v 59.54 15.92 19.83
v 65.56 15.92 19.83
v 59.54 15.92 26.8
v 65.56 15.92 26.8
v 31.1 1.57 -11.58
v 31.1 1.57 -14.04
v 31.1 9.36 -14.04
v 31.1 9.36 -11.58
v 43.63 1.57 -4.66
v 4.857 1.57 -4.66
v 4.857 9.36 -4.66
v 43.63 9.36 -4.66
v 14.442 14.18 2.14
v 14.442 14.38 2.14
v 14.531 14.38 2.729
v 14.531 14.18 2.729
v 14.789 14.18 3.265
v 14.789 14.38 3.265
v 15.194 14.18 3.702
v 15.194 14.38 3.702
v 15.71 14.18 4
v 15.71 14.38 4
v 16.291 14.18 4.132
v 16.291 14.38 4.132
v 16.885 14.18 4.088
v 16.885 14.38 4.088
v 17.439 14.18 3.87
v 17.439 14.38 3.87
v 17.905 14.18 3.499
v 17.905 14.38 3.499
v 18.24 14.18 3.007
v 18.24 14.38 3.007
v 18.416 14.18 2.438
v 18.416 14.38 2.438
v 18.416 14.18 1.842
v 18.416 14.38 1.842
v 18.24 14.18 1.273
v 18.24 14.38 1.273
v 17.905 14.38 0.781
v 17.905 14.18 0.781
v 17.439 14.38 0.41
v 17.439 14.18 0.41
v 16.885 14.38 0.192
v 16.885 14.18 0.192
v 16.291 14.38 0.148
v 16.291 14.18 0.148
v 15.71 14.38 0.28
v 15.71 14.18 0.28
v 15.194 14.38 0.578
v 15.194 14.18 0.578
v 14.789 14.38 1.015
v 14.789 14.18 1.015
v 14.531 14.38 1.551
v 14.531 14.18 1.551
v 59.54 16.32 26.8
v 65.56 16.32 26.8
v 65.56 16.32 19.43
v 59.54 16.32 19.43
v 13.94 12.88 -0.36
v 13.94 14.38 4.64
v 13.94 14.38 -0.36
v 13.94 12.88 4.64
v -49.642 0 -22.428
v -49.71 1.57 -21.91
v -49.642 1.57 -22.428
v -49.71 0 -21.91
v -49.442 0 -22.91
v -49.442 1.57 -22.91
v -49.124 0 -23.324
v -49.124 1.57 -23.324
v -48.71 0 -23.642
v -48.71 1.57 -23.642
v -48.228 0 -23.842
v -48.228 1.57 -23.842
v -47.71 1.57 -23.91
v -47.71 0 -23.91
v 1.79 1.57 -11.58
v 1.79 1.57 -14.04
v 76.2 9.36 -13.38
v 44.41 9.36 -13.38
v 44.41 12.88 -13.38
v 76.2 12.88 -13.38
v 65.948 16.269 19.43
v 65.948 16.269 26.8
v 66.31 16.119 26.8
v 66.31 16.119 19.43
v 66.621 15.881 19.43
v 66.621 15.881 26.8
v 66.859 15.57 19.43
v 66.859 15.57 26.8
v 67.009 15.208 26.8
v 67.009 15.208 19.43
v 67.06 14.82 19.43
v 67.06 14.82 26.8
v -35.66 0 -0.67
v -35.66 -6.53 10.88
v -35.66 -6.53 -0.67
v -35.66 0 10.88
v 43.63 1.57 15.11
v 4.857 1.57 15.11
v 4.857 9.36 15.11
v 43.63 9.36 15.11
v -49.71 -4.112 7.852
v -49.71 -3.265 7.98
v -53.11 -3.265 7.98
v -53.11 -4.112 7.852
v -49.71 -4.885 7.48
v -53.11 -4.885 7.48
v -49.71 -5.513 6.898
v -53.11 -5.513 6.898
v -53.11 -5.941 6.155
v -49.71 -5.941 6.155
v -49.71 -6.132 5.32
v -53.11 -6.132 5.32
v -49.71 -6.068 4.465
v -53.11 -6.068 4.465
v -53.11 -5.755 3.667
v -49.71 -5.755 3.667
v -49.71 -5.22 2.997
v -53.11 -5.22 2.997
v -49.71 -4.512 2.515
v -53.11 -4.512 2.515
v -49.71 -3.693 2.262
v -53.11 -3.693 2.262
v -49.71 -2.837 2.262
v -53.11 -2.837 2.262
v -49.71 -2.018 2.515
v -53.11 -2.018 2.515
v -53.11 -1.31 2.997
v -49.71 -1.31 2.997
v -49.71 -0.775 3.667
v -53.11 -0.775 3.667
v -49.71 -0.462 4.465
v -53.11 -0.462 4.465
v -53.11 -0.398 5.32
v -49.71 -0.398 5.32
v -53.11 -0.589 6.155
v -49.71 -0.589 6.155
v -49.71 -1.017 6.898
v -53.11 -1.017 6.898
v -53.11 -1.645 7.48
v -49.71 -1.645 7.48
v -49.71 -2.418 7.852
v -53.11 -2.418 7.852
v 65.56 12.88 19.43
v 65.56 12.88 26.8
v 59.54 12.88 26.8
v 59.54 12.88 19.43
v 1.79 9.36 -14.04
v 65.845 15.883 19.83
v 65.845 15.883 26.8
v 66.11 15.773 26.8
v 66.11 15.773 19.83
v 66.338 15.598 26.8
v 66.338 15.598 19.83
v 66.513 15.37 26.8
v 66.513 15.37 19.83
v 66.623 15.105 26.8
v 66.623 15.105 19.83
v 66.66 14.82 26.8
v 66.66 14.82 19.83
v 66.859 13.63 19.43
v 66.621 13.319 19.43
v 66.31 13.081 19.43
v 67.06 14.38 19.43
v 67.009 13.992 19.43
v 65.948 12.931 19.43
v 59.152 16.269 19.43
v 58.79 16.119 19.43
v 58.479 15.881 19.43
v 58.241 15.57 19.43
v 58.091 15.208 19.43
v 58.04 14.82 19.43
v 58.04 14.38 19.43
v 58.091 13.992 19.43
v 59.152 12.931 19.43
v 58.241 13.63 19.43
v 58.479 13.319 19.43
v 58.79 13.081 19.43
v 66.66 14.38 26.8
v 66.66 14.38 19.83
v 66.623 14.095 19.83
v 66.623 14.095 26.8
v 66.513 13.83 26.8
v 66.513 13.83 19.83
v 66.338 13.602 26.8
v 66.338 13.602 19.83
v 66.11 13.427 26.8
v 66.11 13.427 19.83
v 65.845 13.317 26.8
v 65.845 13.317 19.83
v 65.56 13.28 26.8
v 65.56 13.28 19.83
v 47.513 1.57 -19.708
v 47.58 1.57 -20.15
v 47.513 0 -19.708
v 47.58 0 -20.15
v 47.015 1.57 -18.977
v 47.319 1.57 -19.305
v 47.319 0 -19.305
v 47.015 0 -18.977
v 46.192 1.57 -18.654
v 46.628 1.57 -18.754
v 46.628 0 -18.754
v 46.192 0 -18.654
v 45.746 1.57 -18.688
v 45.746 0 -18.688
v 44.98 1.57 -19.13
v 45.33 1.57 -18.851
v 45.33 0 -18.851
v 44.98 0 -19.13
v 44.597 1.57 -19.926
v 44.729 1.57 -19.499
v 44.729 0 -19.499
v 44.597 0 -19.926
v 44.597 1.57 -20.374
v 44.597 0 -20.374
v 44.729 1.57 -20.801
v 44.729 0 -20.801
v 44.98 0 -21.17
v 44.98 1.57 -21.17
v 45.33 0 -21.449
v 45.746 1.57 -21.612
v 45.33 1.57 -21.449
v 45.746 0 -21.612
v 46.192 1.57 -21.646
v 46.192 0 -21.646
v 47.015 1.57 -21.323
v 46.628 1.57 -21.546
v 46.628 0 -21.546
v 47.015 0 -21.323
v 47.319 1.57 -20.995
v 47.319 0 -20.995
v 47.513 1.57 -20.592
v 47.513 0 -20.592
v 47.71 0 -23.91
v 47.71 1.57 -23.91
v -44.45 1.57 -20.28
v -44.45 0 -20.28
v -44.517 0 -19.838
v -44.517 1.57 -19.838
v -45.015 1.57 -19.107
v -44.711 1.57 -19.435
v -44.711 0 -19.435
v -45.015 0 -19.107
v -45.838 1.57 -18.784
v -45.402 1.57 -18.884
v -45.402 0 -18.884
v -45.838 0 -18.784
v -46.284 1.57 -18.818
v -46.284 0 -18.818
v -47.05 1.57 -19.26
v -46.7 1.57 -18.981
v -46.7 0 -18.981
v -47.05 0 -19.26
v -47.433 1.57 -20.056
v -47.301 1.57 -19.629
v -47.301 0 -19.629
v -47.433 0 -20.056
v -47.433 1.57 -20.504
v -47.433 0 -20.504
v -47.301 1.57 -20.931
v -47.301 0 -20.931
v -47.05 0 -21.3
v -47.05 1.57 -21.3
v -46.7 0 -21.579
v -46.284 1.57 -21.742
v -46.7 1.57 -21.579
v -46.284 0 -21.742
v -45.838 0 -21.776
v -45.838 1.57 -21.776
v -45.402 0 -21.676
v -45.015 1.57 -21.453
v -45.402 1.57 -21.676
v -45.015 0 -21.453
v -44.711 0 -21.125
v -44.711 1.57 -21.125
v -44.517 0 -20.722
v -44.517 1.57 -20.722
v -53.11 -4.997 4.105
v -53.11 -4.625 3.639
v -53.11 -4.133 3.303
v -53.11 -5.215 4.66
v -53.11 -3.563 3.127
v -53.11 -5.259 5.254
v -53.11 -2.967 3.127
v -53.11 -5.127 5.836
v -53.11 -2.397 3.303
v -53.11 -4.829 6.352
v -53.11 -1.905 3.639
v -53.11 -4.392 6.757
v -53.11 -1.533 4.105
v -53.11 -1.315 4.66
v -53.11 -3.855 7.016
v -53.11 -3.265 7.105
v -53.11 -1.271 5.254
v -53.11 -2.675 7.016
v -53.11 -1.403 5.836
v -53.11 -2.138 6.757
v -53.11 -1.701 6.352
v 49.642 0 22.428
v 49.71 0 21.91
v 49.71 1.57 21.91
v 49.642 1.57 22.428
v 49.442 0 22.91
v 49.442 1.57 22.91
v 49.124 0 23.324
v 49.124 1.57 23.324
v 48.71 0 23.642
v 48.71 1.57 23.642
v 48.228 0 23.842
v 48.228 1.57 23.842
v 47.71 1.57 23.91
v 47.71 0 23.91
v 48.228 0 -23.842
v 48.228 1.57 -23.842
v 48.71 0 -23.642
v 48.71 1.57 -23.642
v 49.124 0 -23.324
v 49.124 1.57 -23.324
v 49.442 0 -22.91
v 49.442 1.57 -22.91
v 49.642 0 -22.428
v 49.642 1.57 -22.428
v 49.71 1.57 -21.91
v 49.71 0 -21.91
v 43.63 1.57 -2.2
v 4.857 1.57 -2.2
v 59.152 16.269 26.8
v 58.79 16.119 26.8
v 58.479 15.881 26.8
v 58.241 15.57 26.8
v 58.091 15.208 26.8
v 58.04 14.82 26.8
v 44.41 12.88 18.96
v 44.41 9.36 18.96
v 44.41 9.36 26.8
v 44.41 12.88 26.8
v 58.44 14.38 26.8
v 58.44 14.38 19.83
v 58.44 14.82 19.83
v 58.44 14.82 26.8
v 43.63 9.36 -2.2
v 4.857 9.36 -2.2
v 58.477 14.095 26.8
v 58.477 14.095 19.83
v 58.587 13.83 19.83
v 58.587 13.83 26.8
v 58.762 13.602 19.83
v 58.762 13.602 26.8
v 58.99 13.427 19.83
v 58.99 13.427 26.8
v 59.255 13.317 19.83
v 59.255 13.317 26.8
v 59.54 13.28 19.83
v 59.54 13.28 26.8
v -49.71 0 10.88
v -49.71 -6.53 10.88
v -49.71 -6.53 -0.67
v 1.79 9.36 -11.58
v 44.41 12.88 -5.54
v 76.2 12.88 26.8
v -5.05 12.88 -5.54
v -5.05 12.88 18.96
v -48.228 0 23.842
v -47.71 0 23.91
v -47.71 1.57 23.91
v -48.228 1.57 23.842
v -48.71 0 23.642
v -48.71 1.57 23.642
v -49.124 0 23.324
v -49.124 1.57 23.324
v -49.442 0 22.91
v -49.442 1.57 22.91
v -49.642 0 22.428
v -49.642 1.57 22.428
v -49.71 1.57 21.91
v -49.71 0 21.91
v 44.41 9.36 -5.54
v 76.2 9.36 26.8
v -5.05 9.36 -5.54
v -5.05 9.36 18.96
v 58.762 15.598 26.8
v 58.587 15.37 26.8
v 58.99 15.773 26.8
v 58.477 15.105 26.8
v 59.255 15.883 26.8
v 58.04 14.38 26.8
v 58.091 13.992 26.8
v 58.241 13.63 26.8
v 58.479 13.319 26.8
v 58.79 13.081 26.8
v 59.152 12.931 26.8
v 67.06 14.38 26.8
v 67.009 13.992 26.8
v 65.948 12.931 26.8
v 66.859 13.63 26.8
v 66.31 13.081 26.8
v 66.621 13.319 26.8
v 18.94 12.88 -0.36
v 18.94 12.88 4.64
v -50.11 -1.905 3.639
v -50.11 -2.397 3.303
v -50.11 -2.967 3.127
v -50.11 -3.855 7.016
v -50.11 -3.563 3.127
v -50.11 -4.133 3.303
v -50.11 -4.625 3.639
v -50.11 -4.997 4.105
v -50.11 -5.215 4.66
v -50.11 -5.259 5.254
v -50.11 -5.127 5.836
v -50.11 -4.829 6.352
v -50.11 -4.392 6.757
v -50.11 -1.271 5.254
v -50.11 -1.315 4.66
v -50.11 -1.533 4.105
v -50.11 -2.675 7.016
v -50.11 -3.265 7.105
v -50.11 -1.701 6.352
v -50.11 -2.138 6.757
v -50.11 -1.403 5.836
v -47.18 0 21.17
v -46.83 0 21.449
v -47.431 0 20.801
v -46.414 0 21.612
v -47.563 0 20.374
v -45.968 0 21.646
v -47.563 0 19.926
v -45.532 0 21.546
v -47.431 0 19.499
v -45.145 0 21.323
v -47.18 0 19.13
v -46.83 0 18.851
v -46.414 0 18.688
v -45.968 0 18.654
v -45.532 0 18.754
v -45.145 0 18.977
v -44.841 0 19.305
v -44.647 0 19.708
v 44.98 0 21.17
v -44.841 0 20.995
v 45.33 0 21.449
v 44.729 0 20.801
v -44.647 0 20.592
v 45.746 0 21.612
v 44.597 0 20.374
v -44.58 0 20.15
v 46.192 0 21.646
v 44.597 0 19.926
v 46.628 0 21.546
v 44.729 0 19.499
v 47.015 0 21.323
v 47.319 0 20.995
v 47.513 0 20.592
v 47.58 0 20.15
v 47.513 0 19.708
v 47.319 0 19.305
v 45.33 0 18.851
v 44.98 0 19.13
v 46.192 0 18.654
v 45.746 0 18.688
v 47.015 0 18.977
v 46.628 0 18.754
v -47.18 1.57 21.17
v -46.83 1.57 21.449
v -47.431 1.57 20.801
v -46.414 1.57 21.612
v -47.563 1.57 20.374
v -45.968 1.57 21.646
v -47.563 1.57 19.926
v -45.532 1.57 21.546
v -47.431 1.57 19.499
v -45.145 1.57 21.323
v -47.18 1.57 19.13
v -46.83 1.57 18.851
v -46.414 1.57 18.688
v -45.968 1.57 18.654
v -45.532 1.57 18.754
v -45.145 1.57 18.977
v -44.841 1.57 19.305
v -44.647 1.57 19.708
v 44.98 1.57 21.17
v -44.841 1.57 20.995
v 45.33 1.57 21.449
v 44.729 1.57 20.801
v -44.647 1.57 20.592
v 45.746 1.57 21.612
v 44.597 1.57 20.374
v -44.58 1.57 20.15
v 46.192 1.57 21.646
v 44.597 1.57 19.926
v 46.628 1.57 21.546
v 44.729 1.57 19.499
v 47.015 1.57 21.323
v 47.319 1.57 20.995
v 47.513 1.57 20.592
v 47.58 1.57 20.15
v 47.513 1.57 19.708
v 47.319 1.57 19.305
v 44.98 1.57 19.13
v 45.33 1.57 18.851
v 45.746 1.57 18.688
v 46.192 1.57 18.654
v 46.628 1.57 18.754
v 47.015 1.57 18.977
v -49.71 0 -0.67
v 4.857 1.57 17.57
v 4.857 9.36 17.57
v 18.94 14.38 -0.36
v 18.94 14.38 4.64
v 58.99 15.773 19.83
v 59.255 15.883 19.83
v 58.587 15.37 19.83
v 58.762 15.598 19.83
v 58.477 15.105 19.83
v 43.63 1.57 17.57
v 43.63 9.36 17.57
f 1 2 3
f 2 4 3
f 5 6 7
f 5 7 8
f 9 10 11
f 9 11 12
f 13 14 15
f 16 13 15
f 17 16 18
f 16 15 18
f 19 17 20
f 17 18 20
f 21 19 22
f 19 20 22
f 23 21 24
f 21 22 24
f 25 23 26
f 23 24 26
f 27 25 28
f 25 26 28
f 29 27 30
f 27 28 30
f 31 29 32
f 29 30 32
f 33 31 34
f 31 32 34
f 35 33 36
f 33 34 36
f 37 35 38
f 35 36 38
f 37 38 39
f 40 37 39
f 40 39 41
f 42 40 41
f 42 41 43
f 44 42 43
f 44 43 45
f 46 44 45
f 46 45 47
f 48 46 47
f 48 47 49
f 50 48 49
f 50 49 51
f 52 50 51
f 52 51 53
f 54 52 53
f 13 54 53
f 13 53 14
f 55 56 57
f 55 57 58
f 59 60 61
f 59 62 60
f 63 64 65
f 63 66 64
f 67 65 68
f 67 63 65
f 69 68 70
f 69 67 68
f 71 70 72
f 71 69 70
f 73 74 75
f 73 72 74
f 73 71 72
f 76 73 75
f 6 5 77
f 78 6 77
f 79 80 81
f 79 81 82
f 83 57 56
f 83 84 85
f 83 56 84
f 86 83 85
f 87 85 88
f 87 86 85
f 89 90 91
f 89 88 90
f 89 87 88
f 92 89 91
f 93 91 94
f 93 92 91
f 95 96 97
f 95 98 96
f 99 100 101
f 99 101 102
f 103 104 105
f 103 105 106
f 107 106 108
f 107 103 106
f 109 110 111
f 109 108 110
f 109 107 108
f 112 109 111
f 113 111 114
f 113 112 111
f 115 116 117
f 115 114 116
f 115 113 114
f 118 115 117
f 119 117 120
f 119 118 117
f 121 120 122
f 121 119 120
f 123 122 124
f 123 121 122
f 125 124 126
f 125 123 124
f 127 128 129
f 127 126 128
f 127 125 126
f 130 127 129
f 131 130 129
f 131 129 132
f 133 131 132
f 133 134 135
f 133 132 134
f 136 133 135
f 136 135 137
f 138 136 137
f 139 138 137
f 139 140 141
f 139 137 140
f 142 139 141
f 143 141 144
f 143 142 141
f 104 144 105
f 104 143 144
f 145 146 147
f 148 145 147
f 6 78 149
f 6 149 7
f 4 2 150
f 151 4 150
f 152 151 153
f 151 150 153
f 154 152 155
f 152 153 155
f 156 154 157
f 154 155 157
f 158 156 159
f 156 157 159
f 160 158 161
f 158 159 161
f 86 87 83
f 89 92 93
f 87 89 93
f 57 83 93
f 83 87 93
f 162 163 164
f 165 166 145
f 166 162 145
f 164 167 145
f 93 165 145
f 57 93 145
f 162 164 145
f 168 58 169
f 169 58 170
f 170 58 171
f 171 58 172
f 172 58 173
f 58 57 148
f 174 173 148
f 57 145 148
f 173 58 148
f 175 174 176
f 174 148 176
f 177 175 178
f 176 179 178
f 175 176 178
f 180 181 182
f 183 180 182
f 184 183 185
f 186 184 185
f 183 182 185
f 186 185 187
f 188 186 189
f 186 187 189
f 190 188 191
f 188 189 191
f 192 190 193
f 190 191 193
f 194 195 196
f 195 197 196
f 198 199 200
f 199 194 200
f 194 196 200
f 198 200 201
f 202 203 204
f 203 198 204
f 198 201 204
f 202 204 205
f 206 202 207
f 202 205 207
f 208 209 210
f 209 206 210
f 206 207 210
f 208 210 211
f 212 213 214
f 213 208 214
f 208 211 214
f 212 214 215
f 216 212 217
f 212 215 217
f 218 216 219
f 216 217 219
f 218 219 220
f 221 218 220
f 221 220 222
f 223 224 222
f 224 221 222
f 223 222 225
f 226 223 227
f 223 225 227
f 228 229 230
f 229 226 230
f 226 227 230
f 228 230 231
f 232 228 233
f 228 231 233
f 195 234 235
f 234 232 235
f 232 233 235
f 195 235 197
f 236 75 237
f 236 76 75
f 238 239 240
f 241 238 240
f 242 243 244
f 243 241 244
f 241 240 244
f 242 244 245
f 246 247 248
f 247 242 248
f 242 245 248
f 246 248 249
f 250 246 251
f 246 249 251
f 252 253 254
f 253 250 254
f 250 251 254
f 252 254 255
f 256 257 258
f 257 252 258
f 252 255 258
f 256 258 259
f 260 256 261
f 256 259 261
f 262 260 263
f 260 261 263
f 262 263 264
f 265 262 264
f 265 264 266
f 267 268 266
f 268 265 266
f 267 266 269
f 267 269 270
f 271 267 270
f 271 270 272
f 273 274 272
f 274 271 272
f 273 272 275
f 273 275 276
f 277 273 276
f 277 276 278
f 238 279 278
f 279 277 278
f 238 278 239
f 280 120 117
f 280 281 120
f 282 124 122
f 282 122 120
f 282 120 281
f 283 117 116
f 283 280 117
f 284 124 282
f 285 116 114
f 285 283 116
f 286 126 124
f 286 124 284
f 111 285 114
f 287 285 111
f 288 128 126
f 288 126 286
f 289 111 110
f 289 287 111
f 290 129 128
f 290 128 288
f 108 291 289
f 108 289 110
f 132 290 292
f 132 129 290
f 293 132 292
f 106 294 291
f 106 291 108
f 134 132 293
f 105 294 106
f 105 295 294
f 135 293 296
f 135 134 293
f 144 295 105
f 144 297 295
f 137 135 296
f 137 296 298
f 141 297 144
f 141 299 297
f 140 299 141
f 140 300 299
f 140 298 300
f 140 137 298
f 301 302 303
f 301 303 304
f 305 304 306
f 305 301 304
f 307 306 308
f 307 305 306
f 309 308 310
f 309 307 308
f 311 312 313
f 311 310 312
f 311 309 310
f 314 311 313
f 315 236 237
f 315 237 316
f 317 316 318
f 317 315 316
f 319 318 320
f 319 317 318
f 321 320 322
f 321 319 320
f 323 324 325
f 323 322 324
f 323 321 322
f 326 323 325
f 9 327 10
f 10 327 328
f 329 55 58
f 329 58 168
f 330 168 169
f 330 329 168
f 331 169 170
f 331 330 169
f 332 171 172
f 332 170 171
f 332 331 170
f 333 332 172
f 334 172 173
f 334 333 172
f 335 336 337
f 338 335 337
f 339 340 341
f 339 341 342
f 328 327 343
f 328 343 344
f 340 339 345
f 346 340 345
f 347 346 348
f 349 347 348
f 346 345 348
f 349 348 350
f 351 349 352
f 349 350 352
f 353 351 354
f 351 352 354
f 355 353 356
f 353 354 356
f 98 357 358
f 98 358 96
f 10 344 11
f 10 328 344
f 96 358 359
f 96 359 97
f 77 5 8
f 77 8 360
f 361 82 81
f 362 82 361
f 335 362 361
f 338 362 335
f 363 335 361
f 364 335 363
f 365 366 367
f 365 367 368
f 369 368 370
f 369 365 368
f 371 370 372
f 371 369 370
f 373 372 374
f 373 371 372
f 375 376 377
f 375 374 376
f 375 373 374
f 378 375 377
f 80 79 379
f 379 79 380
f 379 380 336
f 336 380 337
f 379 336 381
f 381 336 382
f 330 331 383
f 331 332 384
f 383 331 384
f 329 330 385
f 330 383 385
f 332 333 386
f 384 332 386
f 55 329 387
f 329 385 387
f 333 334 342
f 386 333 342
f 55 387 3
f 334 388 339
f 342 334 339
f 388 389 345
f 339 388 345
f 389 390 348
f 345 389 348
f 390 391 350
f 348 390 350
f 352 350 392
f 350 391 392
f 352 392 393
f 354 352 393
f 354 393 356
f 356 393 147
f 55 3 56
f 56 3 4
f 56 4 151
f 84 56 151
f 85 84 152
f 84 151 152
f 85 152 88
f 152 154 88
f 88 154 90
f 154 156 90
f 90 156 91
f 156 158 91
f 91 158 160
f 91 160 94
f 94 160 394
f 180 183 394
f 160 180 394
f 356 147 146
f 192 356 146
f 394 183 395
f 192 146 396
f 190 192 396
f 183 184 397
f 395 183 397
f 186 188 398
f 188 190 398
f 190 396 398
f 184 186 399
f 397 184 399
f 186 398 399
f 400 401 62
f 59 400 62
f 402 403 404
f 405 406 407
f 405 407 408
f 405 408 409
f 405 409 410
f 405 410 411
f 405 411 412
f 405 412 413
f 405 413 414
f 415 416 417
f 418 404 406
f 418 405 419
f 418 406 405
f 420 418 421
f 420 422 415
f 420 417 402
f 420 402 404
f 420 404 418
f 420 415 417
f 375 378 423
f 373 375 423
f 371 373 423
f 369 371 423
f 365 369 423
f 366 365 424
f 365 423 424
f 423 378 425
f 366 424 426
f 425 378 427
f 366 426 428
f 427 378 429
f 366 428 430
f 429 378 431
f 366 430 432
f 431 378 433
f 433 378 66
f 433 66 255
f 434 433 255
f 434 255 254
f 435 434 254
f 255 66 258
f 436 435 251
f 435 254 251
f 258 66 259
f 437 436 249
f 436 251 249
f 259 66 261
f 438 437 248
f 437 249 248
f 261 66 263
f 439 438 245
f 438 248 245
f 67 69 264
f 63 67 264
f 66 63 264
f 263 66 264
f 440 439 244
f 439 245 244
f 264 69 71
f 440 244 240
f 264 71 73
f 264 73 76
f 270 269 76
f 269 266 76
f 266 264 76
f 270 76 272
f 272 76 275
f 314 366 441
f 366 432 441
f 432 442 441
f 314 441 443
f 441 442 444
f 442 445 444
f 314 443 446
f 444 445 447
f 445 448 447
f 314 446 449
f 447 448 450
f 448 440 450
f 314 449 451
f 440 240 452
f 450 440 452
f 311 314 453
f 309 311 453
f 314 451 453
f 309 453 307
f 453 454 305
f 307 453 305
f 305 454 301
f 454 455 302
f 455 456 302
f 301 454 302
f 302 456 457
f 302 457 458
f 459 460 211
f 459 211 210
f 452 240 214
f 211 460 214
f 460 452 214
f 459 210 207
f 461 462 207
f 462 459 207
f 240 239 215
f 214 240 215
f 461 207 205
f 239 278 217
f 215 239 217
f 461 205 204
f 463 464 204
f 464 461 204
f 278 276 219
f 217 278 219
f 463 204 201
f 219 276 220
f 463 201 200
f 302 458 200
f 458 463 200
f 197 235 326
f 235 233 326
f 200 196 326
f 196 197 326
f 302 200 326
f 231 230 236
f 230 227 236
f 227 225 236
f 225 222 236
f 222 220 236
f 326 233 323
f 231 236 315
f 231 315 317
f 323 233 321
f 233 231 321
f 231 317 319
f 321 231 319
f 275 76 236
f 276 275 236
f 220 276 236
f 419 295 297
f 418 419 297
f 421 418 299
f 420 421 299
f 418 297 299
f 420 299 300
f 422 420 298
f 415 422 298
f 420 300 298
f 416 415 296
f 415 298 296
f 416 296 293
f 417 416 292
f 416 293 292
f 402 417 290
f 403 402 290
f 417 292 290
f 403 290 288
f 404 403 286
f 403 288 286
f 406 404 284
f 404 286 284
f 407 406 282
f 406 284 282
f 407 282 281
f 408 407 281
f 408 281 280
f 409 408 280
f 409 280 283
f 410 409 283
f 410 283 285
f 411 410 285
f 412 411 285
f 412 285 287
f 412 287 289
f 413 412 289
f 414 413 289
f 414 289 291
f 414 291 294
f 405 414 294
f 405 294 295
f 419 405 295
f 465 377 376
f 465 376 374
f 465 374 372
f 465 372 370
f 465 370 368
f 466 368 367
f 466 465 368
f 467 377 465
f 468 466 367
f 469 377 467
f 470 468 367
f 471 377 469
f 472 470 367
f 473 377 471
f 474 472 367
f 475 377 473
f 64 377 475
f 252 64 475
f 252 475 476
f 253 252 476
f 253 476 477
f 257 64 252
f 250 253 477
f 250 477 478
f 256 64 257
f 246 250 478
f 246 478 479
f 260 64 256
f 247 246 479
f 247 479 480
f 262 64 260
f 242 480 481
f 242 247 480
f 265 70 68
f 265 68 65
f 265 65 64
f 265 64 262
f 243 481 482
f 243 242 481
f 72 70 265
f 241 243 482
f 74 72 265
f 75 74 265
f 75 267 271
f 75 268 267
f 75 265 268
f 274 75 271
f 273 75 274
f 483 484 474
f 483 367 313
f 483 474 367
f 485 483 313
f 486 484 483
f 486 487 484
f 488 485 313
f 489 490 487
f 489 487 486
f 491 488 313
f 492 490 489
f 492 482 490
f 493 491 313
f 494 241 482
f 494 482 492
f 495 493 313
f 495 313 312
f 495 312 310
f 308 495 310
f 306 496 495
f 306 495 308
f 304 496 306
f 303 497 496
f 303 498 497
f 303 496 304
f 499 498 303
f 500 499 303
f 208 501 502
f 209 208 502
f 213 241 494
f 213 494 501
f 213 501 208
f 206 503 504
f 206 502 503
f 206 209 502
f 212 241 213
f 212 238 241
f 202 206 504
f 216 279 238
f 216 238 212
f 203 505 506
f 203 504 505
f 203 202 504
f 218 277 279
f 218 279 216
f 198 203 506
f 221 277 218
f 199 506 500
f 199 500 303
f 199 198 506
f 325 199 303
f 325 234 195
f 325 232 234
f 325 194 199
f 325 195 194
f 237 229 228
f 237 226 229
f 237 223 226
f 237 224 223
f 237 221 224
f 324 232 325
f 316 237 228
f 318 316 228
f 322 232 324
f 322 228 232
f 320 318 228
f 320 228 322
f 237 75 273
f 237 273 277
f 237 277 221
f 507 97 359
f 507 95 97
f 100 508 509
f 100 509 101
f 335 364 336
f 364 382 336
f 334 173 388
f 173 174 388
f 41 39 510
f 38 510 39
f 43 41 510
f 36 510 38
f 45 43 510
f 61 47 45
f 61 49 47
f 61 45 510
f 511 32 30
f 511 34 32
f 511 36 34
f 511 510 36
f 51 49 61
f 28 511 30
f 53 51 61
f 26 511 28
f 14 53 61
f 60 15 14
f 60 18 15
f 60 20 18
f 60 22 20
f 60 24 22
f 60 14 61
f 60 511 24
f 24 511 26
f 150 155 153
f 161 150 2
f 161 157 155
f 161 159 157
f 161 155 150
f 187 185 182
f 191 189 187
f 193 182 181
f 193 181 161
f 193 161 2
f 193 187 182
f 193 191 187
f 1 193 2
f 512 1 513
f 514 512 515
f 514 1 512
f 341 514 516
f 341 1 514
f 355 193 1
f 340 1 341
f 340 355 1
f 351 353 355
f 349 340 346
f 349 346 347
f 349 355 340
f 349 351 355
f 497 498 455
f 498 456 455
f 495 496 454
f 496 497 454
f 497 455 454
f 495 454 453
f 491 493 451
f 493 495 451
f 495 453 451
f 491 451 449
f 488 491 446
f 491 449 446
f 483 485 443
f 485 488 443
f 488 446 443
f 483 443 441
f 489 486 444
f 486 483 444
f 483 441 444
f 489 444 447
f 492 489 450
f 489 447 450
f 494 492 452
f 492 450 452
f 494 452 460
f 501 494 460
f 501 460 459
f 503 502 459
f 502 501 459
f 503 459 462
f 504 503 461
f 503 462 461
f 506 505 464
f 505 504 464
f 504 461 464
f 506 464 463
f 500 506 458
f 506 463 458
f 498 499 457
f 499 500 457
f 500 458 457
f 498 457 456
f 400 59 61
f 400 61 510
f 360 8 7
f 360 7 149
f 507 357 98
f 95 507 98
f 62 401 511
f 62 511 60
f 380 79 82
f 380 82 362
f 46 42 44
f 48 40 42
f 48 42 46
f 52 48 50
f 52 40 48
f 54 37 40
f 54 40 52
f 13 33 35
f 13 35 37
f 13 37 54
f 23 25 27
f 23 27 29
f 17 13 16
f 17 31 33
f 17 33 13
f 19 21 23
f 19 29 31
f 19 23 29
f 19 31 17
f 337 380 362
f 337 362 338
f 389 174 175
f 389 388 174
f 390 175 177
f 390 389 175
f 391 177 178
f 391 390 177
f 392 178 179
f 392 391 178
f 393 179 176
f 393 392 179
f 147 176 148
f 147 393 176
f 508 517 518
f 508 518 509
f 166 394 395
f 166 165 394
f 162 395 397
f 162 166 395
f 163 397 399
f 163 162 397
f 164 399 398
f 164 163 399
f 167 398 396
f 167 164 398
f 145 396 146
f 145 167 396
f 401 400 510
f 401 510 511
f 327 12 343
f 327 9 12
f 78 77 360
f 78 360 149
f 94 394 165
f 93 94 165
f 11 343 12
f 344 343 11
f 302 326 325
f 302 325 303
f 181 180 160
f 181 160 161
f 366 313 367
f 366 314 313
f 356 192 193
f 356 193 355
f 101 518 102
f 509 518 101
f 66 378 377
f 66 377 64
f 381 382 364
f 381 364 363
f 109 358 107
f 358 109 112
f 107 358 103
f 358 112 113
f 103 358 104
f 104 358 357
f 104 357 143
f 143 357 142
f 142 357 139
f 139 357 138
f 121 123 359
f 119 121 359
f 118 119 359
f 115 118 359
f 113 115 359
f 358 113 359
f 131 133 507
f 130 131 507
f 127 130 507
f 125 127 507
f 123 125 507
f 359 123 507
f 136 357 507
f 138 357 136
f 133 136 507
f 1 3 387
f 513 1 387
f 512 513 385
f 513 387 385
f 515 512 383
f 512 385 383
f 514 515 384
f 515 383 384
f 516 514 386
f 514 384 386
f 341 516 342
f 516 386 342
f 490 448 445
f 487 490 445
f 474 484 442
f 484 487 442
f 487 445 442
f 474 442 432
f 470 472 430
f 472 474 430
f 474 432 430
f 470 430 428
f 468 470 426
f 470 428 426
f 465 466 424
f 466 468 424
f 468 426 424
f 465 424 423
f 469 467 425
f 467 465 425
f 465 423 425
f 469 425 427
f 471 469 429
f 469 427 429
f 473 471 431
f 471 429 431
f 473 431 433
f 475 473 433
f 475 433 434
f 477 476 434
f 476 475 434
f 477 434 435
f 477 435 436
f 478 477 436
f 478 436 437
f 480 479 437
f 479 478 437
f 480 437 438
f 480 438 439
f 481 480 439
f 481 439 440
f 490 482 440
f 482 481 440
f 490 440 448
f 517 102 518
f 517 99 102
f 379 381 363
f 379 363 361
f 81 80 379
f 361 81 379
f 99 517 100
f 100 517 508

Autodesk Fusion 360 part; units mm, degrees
sketch "Sketch1" plane through (0, 0, 0) normal (0, 1, 0) x (1, 0, 0)
  line L0 (47.71, -23.91) -> (-47.71, -23.91)
  line L1 (-49.71, -21.91) -> (-49.71, 21.91)
  line L2 (-47.71, 23.91) -> (47.71, 23.91)
  line L3 (49.71, 21.91) -> (49.71, -21.91)
  line L4 (49.71, -23.91) -> (-49.71, 23.91) construction
  line L5 (-49.71, -23.91) -> (49.71, 23.91) construction
  circle A0 centre (-45.95, 20.28) radius 1.5
  circle A1 centre (46.08, 20.15) radius 1.5
  circle A2 centre (46.08, -20.15) radius 1.5
  circle A3 centre (-46.08, -20.15) radius 1.5
  arc A4 (-47.71, 23.91) -> (-49.71, 21.91) centre (-47.71, 21.91) ccw
  arc A5 (-49.71, -21.91) -> (-47.71, -23.91) centre (-47.71, -21.91) ccw
  arc A6 (47.71, -23.91) -> (49.71, -21.91) centre (47.71, -21.91) ccw
  arc A7 (49.71, 21.91) -> (47.71, 23.91) centre (47.71, 21.91) ccw
  dimension "d1" = 99.42
  dimension "d2" = 47.82
  dimension "d3" = 3
  dimension "d5" = 3.76
  dimension "d6" = 3.63
  dimension "d13" = 3.63
  dimension "d14" = 3.76
  dimension "d15" = 3.76
  dimension "d16" = 3.63
  dimension "d17" = 3.63
  dimension "d18" = 3.76
  dimension "d19" = 2
extrude "Extrude1" add sketch "Sketch1" along normal blind 1.57 makes body 1
sketch "Sketch2" plane through (0, 1.57, 0) normal (0, 1, 0) x (-1, 0, 0)
  circle A0 centre (45.95, -20.28) radius 1.5
  circle A1 centre (46.08, 20.15) radius 1.5
  circle A2 centre (-46.08, 20.15) radius 1.5
  circle A3 centre (-46.08, -20.15) radius 1.5
  arc A4 (-47.71, 23.91) -> (-49.71, 21.91) centre (-47.71, 21.91) ccw
  line L0 (-49.71, 21.91) -> (-49.71, -21.91)
  arc A5 (-49.71, -21.91) -> (-47.71, -23.91) centre (-47.71, -21.91) ccw
  line L1 (-47.71, -23.91) -> (47.71, -23.91)
  arc A6 (47.71, -23.91) -> (49.71, -21.91) centre (47.71, -21.91) ccw
  line L2 (49.71, -21.91) -> (49.71, 21.91)
  arc A7 (49.71, 21.91) -> (47.71, 23.91) centre (47.71, 21.91) ccw
  line L3 (47.71, 23.91) -> (-47.71, 23.91)
  line L4 (-1.79, -14.04) -> (-31.1, -14.04)
  line L5 (-31.1, -14.04) -> (-31.1, -11.58)
  line L6 (-31.1, -11.58) -> (-1.79, -11.58)
  line L7 (-1.79, -11.58) -> (-1.79, -14.04)
  line L8 (-4.8567, 15.11) -> (-43.63, 15.11)
  line L9 (-43.63, 15.11) -> (-43.63, 17.57)
  line L10 (-43.63, 17.57) -> (-4.8567, 17.57)
  line L11 (-4.8567, 17.57) -> (-4.8567, 15.11)
  line L12 (-4.8567, -4.66) -> (-43.63, -4.66)
  line L13 (-43.63, -4.66) -> (-43.63, -2.2)
  line L14 (-43.63, -2.2) -> (-4.8567, -2.2)
  line L15 (-4.8567, -2.2) -> (-4.8567, -4.66)
  dimension "d23" = 2.46
  dimension "d24" = 29.31
  dimension "d25" = 18.61
  dimension "d28" = 2.46
  dimension "d29" = 2.46
  dimension "d30" = 17.31
  dimension "d31" = 6.34
  dimension "d32" = 6.08
  dimension "d33" = 6.08
  dimension "d34" = 44.8533
  dimension "d52" = 6.92
extrude "Extrude2" add sketch "Sketch2" along normal blind 7.79 separate body contours L4 L5 L6 L7 | L8 L9 L10 L11 | L12 L13 L14 L15 makes body 2 at (11.56, 4.1667, -14.04) makes body 3 at (17.7811, 4.1667, -4.66) makes body 4 at (17.7811, 4.1667, 15.11)
sketch "Sketch3" plane through (0, 0, 0) normal (0, -1, 0) x (1, 0, 0)
  circle A0 centre (-45.95, -20.28) radius 1.5
  circle A1 centre (-46.08, 20.15) radius 1.5
  circle A2 centre (46.08, 20.15) radius 1.5
  circle A3 centre (46.08, -20.15) radius 1.5
  arc A4 (49.71, 21.91) -> (47.71, 23.91) centre (47.71, 21.91) ccw
  line L0 (47.71, 23.91) -> (-47.71, 23.91)
  arc A5 (-47.71, 23.91) -> (-49.71, 21.91) centre (-47.71, 21.91) ccw
  line L1 (-49.71, 21.91) -> (-49.71, -21.91)
  arc A6 (-49.71, -21.91) -> (-47.71, -23.91) centre (-47.71, -21.91) ccw
  line L2 (-47.71, -23.91) -> (47.71, -23.91)
  arc A7 (47.71, -23.91) -> (49.71, -21.91) centre (47.71, -21.91) ccw
  line L3 (49.71, -21.91) -> (49.71, 21.91)
  line L4 (-49.71, 10.88) -> (-35.66, 10.88)
  line L5 (-35.66, 10.88) -> (-35.66, -0.67)
  line L6 (-35.66, -0.67) -> (-49.71, -0.67)
  line L7 (-49.71, -0.67) -> (-49.71, 10.88)
  dimension "d37" = 11.55
  dimension "d38" = 14.05
  dimension "d39" = 13.03
extrude "Extrude3" add sketch "Sketch3" along normal blind 6.53 separate body contours L1 L4 L5 L6 L7 makes body 5
sketch "Sketch4" plane through (-49.71, 0, 0) normal (-1, 0, 0) x (0, 0, 1)
  line L0 (10.88, 0) -> (-0.67, 0)
  line L1 (-0.67, 0) -> (-0.67, -6.53)
  line L2 (-0.67, -6.53) -> (10.88, -6.53)
  line L3 (10.88, -6.53) -> (10.88, 0)
  circle A0 centre (5.105, -3.265) radius 2.875
  line L4 (10.88, -3.265) -> (-0.67, -3.265) construction
  dimension "d42" = 5.75
extrude "Extrude4" add sketch "Sketch4" along normal blind 3.4 contours A0 bodies 5
sketch "Sketch5" plane through (-53.11, 0, 0) normal (-1, 0, 0) x (0, 0, 1)
  circle A0 centre (5.105, -3.265) radius 2.875
  circle A1 centre (5.105, -3.265) radius 2
  dimension "d45" = 4
extrude "Extrude5" cut sketch "Sketch5" against normal blind 3 contours A1 bodies 5
sketch "Sketch6" plane through (0, 9.36, 0) normal (0, 1, 0) x (-1, 0, 0)
  line L0 (-4.8567, -2.2) -> (-43.63, -2.2)
  line L1 (-43.63, -2.2) -> (-43.63, -4.66)
  line L2 (-43.63, -4.66) -> (-4.8567, -4.66)
  line L3 (-4.8567, -4.66) -> (-4.8567, -2.2)
  line L4 (-44.41, -13.38) -> (-76.2, -13.38)
  line L5 (-76.2, -13.38) -> (-76.2, 26.8)
  line L6 (-76.2, 26.8) -> (-44.41, 26.8)
  line L7 (5.05, 18.96) -> (5.05, -5.54)
  line L8 (-49.71, 21.91) -> (-49.71, -21.91)
  line L9 (-4.8567, 17.57) -> (-43.63, 17.57)
  line L10 (5.05, 18.96) -> (-44.41, 18.96)
  line L11 (5.05, -5.54) -> (-44.41, -5.54)
  line L12 (-44.41, -13.38) -> (-44.41, -5.54)
  line L13 (-44.41, 18.96) -> (-44.41, 26.8)
  dimension "d50" = 26.49
  dimension "d51" = 9.23
  dimension "d53" = 31.79
  dimension "d54" = 24.5
  dimension "d56" = 49.46
  dimension "d57" = 7.84
  dimension "d58" = 7.84
extrude "Extrude6" add sketch "Sketch6" along normal blind 3.52 separate body contours L0 L1 L2 L3 | L4 L5 L6 L7 L10 L11 L12 L13 makes body 6
sketch "Sketch7" plane through (0, 12.88, 0) normal (0, 1, 0) x (-1, 0, 0)
  line L0 (5.05, 18.96) -> (-44.41, 18.96)
  line L1 (-44.41, 18.96) -> (-44.41, 26.8)
  line L2 (-44.41, 26.8) -> (-76.2, 26.8)
  line L3 (-76.2, 26.8) -> (-76.2, -13.38)
  line L4 (-76.2, -13.38) -> (-44.41, -13.38)
  line L5 (-44.41, -13.38) -> (-44.41, -5.54)
  line L6 (-44.41, -5.54) -> (5.05, -5.54)
  line L7 (5.05, -5.54) -> (5.05, 18.96)
  line L8 (-58.04, 26.8) -> (-67.06, 26.8)
  line L9 (-67.06, 26.8) -> (-67.06, 19.43)
  line L10 (-67.06, 19.43) -> (-58.04, 19.43)
  line L11 (-58.04, 19.43) -> (-58.04, 26.8)
  dimension "d61" = 9.14
  dimension "d62" = 7.37
  dimension "d63" = 9.02
extrude "Extrude7" add sketch "Sketch7" along normal blind 3.44 separate body contours L2 L8 L9 L10 L11 makes body 7
fillet "Fillet1" radius 1.5 4 edges at (58.04, 12.88, 23.115) (58.04, 16.32, 23.115) (67.06, 16.32, 23.115) (67.06, 12.88, 23.115) on bodies 7
shell "Shell1" thickness 0.4 removed faces 1 at (63.5533, 15.1733, 26.8) on bodies 7
sketch "Sketch8" plane through (0, 12.88, 0) normal (0, 1, 0) x (-1, 0, 0)
  line L0 (5.05, 18.96) -> (-44.41, 18.96)
  line L1 (-44.41, 18.96) -> (-44.41, 26.8)
  line L2 (-44.41, 26.8) -> (-76.2, 26.8)
  line L3 (-76.2, 26.8) -> (-76.2, -13.38)
  line L4 (-76.2, -13.38) -> (-44.41, -13.38)
  line L5 (-44.41, -13.38) -> (-44.41, -5.54)
  line L6 (-44.41, -5.54) -> (5.05, -5.54)
  line L7 (5.05, -5.54) -> (5.05, 18.96)
  line L8 (-13.94, -0.36) -> (-18.94, -0.36)
  line L9 (-18.94, -0.36) -> (-18.94, 4.64)
  line L10 (-18.94, 4.64) -> (-13.94, 4.64)
  line L11 (-13.94, 4.64) -> (-13.94, -0.36)
  dimension "d69" = 5
  dimension "d70" = 5
  dimension "d71" = 18.99
  dimension "d72" = 5.18
extrude "Extrude8" add sketch "Sketch8" along normal blind 1.5 separate body contours L8 L9 L10 L11 makes body 8
sketch "Sketch9" plane through (0, 14.38, 0) normal (0, 1, 0) x (-1, 0, 0)
  line L0 (-13.94, 4.64) -> (-18.94, 4.64)
  line L1 (-18.94, 4.64) -> (-18.94, -0.36)
  line L2 (-18.94, -0.36) -> (-13.94, -0.36)
  line L3 (-13.94, -0.36) -> (-13.94, 4.64)
  circle A0 centre (-16.44, 2.14) radius 1.9979
  line L4 (-16.44, -0.36) -> (-16.44, 4.64) construction
extrude "Extrude9" cut sketch "Sketch9" against normal blind 0.2 contours A0 bodies 8
equation "d13 = PCBhole_shortside"
equation "d14 = PCBhole_longside"
equation "d15 = PCBhole_longside"
equation "d16 = PCBhole_shortside"
equation "d17 = PCBhole_shortside"
equation "d18 = PCBhole_longside"
equation "d20 = PCBthickness"
equation "d23 = HeaderSMD_thickness"
equation "d28 = HeaderSMD_thickness"
equation "d29 = HeaderSMD_thickness"
equation "d35 = HeaderSMD_Height"
equation "d59 = 1.57 mm + 1.95 mm"
equation "PCBthickness = 1.57 mm"
equation "PCBhole_longside = 3.76 mm"
equation "PCBhole_shortside = 3.63 mm"
equation "HeaderSMD_thickness = 2.46 mm"
equation "HeaderSMD_Height = 7.79 mm"
